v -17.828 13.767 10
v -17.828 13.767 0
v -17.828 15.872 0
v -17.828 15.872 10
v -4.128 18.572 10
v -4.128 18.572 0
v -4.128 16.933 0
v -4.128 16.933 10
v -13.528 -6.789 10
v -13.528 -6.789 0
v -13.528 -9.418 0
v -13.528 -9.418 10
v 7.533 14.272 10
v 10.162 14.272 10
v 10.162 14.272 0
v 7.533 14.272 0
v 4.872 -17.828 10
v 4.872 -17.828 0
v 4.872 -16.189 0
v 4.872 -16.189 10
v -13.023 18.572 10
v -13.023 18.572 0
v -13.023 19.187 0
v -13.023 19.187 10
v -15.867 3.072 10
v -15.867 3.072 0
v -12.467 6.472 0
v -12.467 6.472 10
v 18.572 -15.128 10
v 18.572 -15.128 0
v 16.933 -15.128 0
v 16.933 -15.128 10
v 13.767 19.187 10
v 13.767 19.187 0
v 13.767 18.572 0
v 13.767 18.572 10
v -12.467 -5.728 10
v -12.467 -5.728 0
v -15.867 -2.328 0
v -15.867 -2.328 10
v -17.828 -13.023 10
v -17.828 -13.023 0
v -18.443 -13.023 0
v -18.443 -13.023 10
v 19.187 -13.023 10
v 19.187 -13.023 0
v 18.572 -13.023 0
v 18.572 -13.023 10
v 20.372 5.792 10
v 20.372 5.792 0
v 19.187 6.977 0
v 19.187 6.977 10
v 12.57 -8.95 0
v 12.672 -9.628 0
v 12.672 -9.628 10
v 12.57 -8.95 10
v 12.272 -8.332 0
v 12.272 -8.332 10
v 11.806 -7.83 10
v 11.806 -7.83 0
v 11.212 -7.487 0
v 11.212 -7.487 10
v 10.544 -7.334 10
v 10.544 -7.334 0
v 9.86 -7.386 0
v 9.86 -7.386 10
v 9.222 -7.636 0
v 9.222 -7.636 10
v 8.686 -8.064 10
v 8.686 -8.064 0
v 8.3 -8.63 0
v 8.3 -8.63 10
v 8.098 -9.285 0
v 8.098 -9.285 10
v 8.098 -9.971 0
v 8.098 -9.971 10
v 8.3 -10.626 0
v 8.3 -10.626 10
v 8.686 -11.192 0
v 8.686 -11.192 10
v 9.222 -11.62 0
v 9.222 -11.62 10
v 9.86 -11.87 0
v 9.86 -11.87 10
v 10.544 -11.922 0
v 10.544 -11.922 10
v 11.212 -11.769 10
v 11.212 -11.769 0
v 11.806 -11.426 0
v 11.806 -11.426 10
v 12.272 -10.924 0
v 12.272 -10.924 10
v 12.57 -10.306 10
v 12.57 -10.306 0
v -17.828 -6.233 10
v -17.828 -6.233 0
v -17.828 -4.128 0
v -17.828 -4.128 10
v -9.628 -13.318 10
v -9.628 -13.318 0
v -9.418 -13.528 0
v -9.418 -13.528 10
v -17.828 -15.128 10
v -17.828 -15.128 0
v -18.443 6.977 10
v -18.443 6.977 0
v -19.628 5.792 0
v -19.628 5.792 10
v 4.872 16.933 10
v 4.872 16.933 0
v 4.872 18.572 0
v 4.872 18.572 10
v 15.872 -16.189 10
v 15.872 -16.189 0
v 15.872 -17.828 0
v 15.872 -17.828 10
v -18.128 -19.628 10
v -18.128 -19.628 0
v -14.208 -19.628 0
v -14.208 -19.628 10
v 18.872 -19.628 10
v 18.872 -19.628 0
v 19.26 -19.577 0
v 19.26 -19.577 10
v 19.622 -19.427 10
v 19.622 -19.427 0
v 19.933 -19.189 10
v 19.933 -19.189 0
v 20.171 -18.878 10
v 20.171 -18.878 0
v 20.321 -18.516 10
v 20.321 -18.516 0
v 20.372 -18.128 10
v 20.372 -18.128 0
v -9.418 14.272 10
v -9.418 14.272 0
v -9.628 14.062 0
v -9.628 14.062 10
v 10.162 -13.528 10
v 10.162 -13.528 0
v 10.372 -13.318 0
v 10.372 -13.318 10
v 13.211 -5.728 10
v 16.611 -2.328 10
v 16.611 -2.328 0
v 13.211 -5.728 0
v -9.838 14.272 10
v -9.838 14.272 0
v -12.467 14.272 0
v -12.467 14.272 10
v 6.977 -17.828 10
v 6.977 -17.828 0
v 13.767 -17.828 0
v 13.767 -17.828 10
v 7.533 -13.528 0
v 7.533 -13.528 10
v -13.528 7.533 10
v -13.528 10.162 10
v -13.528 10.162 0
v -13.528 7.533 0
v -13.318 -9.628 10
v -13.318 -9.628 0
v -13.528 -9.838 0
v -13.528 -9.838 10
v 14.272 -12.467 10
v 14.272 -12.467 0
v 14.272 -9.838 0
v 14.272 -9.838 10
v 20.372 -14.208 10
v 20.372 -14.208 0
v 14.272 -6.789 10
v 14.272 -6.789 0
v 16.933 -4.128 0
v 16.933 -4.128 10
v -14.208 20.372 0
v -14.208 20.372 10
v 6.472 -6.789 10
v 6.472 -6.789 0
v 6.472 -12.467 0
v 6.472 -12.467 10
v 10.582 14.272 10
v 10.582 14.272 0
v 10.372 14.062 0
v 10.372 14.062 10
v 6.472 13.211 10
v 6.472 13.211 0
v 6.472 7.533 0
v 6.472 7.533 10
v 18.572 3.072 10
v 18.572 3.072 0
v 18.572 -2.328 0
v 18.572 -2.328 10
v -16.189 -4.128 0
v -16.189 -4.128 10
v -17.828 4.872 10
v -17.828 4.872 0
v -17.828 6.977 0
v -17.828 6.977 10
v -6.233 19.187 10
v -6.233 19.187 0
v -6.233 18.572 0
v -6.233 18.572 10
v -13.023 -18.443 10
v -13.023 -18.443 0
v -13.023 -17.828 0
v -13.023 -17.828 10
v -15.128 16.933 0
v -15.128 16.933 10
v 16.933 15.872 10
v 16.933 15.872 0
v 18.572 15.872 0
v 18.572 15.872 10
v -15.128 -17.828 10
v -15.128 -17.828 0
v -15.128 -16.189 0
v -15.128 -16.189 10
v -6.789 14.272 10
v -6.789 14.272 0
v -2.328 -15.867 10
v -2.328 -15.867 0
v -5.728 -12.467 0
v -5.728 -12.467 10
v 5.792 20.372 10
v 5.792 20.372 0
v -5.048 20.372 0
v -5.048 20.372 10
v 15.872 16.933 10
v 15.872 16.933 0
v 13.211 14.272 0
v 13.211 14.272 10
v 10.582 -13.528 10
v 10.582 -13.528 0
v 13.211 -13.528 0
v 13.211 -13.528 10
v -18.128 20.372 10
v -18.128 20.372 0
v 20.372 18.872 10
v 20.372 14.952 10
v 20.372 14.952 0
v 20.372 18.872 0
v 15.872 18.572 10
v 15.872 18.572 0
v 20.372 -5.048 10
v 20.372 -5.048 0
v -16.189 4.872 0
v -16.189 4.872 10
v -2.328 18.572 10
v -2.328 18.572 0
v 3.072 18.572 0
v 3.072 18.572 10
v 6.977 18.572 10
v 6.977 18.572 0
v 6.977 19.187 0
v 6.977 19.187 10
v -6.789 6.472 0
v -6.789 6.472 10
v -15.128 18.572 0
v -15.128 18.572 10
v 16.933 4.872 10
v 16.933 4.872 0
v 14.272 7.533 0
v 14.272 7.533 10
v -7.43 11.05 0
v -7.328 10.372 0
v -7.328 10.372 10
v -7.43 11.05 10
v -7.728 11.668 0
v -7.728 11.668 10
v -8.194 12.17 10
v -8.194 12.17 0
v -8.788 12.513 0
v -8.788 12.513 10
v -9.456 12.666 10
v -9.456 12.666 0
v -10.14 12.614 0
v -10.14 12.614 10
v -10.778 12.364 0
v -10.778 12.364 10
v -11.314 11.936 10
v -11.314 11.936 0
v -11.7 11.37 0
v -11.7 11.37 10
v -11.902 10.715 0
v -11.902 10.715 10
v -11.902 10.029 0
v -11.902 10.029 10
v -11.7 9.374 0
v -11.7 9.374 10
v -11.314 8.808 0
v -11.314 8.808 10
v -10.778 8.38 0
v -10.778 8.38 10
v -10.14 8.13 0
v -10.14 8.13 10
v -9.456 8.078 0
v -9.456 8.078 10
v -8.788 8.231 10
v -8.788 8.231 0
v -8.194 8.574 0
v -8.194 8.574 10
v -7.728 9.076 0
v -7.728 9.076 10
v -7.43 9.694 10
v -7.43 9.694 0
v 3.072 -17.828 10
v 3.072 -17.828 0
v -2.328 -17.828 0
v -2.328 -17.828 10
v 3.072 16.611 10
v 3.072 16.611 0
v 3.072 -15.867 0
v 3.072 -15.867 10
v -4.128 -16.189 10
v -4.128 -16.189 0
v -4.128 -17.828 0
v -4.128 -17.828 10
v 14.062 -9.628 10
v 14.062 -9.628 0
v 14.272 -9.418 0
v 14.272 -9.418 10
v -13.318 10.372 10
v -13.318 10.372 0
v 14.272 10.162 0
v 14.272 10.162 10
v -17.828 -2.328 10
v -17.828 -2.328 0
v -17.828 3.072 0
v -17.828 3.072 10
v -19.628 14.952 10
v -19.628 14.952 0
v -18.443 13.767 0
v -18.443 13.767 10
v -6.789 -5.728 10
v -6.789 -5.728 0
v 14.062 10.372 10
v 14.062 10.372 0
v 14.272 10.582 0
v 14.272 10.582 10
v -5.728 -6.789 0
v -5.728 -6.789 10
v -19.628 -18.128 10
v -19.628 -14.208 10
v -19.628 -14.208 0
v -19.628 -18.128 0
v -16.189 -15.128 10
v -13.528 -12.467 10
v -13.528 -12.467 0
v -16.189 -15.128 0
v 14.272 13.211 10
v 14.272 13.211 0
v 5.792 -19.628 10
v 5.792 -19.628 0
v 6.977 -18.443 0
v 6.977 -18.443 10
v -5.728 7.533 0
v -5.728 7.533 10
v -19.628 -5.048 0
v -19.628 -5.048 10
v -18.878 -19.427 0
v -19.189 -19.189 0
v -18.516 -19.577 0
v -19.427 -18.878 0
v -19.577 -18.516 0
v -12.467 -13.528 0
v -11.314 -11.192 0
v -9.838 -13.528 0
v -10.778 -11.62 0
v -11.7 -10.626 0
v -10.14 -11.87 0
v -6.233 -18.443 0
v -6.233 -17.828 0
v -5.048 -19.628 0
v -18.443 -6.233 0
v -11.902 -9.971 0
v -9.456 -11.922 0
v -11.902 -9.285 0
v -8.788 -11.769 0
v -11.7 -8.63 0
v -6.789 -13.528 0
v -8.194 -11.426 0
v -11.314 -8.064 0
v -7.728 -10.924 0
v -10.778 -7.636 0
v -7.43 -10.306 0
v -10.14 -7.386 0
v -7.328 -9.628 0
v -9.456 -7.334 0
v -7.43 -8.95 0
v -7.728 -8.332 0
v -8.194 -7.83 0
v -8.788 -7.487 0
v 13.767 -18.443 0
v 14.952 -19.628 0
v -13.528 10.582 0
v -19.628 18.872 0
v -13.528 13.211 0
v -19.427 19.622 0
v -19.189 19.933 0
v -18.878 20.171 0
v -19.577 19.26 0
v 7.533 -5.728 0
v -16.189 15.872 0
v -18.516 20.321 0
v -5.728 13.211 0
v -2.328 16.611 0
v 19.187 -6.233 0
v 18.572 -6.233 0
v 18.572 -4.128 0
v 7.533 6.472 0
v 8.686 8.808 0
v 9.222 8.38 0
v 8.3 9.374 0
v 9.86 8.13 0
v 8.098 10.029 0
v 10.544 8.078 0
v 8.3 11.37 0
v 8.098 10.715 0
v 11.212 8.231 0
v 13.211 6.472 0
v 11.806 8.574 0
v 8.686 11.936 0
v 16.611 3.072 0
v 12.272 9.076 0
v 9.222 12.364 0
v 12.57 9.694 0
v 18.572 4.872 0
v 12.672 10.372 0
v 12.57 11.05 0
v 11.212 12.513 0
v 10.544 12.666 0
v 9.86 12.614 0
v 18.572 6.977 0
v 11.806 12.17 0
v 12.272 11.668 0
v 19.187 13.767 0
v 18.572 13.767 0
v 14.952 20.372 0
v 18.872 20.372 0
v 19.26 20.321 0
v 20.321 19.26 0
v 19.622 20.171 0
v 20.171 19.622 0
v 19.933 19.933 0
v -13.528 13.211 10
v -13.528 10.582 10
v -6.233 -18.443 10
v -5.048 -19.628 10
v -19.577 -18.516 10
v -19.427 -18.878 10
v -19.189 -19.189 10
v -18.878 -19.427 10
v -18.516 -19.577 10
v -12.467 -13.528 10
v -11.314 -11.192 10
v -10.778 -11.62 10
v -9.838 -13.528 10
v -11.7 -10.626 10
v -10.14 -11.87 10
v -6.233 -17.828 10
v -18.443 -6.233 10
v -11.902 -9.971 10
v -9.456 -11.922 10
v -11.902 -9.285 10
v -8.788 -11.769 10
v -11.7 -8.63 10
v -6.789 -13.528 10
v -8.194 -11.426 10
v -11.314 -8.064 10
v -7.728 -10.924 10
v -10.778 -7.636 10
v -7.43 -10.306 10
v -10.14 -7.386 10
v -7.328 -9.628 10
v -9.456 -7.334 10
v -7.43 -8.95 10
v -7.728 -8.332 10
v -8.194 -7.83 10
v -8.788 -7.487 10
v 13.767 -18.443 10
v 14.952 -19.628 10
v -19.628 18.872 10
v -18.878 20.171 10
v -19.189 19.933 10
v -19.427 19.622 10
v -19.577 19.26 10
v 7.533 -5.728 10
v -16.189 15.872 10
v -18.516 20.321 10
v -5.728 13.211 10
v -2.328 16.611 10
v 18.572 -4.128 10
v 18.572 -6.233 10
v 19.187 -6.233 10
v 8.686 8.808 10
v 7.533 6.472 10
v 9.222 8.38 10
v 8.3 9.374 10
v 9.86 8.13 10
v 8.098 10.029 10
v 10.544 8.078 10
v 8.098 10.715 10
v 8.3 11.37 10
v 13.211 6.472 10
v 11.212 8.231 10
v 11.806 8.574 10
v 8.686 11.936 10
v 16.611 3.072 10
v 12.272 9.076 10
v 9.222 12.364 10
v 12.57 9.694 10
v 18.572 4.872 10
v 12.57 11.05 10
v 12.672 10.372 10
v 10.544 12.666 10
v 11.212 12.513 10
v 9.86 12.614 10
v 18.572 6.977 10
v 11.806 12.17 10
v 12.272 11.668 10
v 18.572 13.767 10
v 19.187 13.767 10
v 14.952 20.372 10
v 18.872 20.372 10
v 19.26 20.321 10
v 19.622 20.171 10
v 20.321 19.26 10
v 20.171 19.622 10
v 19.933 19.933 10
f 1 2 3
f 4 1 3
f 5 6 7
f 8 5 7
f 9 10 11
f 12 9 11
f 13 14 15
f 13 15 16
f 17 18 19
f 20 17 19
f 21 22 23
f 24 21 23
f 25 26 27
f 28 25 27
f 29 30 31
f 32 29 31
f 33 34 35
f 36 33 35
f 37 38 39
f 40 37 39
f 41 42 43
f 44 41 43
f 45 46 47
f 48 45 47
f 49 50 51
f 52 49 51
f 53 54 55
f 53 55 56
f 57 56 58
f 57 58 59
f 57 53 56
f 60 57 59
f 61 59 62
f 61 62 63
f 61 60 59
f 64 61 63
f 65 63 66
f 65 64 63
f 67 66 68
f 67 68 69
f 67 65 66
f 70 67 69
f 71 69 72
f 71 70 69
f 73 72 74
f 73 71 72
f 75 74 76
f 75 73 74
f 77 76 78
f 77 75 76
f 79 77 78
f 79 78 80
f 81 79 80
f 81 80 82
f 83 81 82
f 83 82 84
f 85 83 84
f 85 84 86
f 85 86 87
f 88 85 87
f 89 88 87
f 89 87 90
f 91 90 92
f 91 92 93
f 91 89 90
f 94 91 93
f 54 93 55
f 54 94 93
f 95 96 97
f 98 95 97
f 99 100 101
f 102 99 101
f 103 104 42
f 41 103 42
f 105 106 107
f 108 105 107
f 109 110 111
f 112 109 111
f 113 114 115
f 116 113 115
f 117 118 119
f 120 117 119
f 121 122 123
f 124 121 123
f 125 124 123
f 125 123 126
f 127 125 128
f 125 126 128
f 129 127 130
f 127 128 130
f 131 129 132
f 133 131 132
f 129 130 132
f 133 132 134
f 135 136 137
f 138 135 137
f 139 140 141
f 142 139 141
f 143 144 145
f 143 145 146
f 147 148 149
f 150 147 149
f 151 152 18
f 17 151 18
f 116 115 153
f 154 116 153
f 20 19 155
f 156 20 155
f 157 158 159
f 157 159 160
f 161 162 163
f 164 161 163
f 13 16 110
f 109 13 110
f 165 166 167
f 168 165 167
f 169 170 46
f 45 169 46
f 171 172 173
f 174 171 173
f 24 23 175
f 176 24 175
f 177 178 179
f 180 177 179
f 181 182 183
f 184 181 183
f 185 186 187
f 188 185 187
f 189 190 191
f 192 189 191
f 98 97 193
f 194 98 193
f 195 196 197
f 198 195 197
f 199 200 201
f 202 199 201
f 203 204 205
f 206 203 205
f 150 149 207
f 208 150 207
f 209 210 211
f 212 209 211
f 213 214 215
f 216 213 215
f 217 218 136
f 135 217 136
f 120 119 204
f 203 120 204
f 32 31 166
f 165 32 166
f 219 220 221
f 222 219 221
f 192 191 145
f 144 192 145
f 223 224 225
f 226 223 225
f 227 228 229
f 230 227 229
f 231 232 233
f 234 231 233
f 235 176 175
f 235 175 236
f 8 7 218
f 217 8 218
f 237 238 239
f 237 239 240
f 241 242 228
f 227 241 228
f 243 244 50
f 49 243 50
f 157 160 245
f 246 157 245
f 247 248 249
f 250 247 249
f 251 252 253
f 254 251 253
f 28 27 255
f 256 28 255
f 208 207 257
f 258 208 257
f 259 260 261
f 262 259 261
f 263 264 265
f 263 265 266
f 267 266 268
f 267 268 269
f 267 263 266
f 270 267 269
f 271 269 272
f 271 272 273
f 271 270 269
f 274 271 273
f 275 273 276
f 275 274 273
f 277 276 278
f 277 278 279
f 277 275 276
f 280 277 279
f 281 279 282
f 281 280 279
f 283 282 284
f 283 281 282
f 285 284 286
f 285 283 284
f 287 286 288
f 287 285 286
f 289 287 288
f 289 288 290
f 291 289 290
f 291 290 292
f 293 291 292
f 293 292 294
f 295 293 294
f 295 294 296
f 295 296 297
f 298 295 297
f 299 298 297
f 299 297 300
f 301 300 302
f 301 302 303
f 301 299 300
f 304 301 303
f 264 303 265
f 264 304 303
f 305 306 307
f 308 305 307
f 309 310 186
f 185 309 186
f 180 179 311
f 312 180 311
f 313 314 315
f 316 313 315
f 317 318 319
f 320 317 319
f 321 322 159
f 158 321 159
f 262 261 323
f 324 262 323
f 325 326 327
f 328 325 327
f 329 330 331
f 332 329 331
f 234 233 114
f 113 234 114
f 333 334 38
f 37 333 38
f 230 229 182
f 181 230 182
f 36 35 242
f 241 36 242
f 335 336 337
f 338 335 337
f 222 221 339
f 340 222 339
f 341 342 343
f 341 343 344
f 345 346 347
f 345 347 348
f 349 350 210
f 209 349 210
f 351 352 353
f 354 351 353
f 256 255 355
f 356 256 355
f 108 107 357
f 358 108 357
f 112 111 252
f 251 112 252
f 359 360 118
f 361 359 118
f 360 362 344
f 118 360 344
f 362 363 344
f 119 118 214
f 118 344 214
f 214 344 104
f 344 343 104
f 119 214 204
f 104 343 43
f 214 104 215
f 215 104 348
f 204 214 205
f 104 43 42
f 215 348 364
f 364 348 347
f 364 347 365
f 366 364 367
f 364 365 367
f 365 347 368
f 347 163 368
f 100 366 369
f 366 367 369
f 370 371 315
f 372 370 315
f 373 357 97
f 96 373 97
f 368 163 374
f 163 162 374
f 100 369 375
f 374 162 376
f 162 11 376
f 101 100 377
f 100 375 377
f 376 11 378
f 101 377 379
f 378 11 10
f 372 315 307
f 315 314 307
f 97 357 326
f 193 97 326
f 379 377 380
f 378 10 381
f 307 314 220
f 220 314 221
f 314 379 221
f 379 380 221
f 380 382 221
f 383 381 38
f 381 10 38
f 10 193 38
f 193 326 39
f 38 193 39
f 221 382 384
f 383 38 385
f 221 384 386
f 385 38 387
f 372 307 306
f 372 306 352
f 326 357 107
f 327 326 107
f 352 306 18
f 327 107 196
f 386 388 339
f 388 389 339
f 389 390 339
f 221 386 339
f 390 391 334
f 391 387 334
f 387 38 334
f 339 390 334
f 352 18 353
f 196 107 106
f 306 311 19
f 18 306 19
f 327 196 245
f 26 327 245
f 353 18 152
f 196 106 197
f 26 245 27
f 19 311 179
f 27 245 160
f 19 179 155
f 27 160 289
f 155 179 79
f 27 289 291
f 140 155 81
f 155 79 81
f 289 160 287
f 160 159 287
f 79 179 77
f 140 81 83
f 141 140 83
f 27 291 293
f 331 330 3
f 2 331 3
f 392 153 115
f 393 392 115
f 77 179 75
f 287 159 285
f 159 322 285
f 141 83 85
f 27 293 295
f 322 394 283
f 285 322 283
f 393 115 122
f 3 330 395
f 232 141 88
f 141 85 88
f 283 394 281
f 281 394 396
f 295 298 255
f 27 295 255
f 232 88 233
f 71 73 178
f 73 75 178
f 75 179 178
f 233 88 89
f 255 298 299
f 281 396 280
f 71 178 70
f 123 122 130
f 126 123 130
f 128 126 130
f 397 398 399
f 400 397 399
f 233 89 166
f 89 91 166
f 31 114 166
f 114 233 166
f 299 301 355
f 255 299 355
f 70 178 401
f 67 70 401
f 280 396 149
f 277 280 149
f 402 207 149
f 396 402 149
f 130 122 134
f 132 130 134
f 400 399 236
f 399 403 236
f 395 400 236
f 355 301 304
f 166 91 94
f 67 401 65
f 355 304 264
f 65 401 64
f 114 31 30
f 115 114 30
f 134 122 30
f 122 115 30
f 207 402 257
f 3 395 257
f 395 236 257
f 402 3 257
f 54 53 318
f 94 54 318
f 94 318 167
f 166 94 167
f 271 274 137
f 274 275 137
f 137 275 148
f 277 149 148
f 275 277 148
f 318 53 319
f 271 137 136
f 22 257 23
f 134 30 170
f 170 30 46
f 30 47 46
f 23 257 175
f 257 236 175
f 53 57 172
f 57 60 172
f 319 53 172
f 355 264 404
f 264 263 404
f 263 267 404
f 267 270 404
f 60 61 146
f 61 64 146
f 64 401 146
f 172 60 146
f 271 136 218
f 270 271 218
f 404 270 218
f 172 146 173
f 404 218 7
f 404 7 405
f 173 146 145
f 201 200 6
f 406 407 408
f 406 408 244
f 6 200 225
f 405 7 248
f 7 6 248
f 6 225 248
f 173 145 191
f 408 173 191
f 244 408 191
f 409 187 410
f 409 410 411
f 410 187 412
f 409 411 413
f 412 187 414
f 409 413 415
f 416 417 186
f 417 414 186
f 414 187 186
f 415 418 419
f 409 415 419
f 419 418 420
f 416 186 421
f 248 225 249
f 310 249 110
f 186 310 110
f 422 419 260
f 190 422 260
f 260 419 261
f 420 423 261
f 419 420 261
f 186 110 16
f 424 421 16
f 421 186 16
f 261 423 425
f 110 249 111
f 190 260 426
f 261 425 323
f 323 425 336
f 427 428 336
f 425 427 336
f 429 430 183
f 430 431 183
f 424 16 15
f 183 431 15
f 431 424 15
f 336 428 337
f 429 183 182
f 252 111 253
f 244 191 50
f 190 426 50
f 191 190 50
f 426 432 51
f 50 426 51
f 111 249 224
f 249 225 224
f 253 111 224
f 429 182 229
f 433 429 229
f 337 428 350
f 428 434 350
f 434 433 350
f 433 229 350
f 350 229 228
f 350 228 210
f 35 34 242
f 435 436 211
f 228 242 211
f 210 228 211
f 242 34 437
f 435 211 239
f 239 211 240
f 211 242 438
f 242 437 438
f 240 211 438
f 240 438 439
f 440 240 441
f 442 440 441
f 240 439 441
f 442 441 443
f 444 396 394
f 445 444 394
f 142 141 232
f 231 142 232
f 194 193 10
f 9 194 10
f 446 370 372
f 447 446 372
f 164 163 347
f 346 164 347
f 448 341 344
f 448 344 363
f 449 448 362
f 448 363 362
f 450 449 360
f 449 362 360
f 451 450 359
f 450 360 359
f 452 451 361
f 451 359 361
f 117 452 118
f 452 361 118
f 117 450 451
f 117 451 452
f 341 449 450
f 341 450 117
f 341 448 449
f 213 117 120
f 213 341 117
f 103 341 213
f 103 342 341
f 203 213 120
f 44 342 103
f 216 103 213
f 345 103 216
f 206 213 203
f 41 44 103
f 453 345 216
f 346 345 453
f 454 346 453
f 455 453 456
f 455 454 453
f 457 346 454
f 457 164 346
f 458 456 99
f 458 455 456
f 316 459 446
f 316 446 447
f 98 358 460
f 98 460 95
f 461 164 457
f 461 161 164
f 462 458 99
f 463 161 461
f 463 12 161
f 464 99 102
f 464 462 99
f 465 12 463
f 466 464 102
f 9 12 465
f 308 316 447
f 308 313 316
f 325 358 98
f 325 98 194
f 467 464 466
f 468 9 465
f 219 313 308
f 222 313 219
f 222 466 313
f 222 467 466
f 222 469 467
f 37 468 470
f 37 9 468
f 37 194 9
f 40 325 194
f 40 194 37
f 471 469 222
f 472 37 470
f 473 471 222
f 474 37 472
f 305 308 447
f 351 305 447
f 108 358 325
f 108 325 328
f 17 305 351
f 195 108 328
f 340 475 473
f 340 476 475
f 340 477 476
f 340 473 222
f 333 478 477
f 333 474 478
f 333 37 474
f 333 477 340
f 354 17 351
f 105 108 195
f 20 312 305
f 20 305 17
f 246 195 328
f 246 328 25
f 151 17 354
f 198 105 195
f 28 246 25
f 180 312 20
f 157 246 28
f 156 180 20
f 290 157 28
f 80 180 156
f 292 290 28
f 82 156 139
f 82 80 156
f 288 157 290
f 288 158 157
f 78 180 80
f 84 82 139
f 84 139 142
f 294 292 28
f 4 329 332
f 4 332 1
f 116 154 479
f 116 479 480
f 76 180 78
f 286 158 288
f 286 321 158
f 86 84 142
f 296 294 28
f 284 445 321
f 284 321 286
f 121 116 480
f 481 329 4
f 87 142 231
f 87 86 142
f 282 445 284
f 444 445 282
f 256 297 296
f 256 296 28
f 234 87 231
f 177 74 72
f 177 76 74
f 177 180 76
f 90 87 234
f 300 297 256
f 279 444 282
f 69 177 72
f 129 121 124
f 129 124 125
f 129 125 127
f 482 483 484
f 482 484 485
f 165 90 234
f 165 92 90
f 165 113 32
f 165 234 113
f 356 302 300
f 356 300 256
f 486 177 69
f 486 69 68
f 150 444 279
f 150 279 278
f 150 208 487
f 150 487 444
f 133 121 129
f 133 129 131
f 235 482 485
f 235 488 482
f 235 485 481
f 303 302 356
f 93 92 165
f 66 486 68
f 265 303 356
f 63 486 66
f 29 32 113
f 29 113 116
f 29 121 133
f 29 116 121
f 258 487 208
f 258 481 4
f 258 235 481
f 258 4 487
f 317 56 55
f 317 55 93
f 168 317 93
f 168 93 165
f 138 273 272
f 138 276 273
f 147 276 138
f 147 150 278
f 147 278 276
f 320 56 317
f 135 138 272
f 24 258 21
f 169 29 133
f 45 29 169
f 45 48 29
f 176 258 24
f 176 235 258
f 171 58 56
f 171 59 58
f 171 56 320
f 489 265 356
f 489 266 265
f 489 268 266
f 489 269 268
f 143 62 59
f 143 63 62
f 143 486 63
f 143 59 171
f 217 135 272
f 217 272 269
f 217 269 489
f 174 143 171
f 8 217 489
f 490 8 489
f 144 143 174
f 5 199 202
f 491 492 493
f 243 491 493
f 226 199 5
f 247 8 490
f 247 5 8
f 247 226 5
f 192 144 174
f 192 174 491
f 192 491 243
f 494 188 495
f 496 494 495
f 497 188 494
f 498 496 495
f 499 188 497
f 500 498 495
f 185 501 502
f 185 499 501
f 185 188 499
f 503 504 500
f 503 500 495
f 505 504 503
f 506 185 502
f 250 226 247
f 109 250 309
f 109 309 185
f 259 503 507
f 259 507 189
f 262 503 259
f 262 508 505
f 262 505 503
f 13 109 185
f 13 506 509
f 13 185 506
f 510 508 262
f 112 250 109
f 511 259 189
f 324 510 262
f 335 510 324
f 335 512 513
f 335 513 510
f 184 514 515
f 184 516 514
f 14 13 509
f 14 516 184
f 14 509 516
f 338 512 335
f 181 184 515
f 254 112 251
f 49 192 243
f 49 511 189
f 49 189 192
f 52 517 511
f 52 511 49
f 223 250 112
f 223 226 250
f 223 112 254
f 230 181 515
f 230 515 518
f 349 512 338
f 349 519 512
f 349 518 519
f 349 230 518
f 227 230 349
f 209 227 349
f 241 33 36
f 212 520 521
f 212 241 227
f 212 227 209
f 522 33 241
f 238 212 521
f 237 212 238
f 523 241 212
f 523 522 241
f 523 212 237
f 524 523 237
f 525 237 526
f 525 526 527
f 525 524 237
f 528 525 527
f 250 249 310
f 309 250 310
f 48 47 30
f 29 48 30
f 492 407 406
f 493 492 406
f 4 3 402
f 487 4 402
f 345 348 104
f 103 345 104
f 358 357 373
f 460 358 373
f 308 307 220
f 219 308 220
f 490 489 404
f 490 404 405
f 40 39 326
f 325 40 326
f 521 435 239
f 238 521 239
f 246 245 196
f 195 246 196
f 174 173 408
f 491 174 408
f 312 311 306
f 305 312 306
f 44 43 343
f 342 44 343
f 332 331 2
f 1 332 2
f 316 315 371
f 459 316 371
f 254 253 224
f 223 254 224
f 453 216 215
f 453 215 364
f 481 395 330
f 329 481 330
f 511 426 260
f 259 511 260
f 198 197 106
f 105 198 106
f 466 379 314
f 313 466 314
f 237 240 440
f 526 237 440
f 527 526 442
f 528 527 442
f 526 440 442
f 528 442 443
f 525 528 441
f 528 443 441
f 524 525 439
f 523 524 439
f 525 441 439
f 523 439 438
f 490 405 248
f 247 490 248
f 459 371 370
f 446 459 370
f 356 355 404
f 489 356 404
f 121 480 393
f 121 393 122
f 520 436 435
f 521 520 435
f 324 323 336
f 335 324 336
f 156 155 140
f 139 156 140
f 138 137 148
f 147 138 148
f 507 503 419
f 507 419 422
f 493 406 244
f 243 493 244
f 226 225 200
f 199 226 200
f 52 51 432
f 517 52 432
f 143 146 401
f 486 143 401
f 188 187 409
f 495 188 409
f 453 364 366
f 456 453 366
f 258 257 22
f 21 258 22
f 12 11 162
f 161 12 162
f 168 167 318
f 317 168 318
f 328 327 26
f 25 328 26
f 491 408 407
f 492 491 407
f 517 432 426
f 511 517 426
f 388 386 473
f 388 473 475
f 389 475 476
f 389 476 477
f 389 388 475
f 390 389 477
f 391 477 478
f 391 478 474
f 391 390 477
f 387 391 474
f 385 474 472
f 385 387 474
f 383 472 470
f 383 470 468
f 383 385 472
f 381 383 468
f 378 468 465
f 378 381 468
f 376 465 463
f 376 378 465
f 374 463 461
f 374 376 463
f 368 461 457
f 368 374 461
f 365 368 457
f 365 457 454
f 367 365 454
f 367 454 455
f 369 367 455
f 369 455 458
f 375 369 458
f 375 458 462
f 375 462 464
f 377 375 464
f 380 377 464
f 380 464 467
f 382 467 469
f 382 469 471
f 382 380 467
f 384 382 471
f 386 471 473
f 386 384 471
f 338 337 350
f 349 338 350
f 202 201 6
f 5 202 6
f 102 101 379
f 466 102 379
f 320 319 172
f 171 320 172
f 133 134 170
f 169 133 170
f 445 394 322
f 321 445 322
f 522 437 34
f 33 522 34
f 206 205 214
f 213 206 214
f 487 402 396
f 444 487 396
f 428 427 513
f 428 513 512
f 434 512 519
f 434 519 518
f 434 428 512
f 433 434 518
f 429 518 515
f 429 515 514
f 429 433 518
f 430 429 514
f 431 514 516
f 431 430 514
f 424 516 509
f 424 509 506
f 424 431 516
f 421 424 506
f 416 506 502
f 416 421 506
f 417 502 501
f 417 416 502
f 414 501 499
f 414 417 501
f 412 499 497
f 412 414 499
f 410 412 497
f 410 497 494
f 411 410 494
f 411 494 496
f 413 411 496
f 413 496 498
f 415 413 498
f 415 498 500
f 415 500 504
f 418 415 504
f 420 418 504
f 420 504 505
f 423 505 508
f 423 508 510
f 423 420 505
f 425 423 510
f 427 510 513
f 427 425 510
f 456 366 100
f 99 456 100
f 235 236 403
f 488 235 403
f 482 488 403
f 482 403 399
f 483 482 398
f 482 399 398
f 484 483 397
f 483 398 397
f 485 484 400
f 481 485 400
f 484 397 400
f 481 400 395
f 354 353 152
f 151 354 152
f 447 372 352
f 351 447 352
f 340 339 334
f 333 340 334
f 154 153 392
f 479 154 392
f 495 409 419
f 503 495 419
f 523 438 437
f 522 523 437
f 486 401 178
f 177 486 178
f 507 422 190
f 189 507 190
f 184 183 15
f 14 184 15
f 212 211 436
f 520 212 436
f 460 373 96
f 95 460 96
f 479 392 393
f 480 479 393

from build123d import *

# Parameters (mm, degrees)
SKETCH1_R           = 2.3
BOSS_EXTRUDE1_DEPTH = 10


with BuildPart() as part:
    # Sketch1 → Boss-Extrude1 (new body)
    with BuildSketch(Plane.XY):
        with BuildLine():
            Line((14.271948898, -9.838051102), (14.061948898, -9.628051102))
            Line((14.061948898, -9.628051102), (14.271948898, -9.418051102))
            Line((14.271948898, -9.418051102), (14.271948898, -6.788711274))
            Line((14.271948898, -6.788711274), (16.932609069, -4.128051102))
            Line((16.932609069, -4.128051102), (18.571948898, -4.128051102))
            Line((18.571948898, -4.128051102), (18.571948898, -6.233051102))
            Line((18.571948898, -6.233051102), (19.186948898, -6.233051102))
            Line((19.186948898, -6.233051102), (20.371948898, -5.048051102))
            Line((20.371948898, -5.048051102), (20.371948898, 5.791948898))
            Line((20.371948898, 5.791948898), (19.186948898, 6.976948898))
            Line((19.186948898, 6.976948898), (18.571948898, 6.976948898))
            Line((18.571948898, 6.976948898), (18.571948898, 4.871948898))
            Line((18.571948898, 4.871948898), (16.932609069, 4.871948898))
            Line((16.932609069, 4.871948898), (14.271948898, 7.532609069))
            Line((14.271948898, 7.532609069), (14.271948898, 10.161948898))
            Line((14.271948898, 10.161948898), (14.061948898, 10.371948898))
            Line((14.061948898, 10.371948898), (14.271948898, 10.581948898))
            Line((14.271948898, 10.581948898), (14.271948898, 13.211288726))
            Line((14.271948898, 13.211288726), (16.932609069, 15.871948898))
            Line((16.932609069, 15.871948898), (18.571948898, 15.871948898))
            Line((18.571948898, 15.871948898), (18.571948898, 13.766948898))
            Line((18.571948898, 13.766948898), (19.186948898, 13.766948898))
            Line((19.186948898, 13.766948898), (20.371948898, 14.951948898))
            Line((20.371948898, 14.951948898), (20.371948898, 18.871948898))
            ThreePointArc((20.371948898, 18.871948898), (19.932609069, 19.932609069), (18.871948898, 20.371948898))
            Line((18.871948898, 20.371948898), (14.951948898, 20.371948898))
            Line((14.951948898, 20.371948898), (13.766948898, 19.186948898))
            Line((13.766948898, 19.186948898), (13.766948898, 18.571948898))
            Line((13.766948898, 18.571948898), (15.871948898, 18.571948898))
            Line((15.871948898, 18.571948898), (15.871948898, 16.932609069))
            Line((15.871948898, 16.932609069), (13.211288726, 14.271948898))
            Line((13.211288726, 14.271948898), (10.581948898, 14.271948898))
            Line((10.581948898, 14.271948898), (10.371948898, 14.061948898))
            Line((10.371948898, 14.061948898), (10.161948898, 14.271948898))
            Line((10.161948898, 14.271948898), (7.532609069, 14.271948898))
            Line((7.532609069, 14.271948898), (4.871948898, 16.932609069))
            Line((4.871948898, 16.932609069), (4.871948898, 18.571948898))
            Line((4.871948898, 18.571948898), (6.976948898, 18.571948898))
            Line((6.976948898, 18.571948898), (6.976948898, 19.186948898))
            Line((6.976948898, 19.186948898), (5.791948898, 20.371948898))
            Line((5.791948898, 20.371948898), (-5.048051102, 20.371948898))
            Line((-5.048051102, 20.371948898), (-6.233051102, 19.186948898))
            Line((-6.233051102, 19.186948898), (-6.233051102, 18.571948898))
            Line((-6.233051102, 18.571948898), (-4.128051102, 18.571948898))
            Line((-4.128051102, 18.571948898), (-4.128051102, 16.932609069))
            Line((-4.128051102, 16.932609069), (-6.788711274, 14.271948898))
            Line((-6.788711274, 14.271948898), (-9.418051102, 14.271948898))
            Line((-9.418051102, 14.271948898), (-9.628051102, 14.061948898))
            Line((-9.628051102, 14.061948898), (-9.838051102, 14.271948898))
            Line((-9.838051102, 14.271948898), (-12.467390931, 14.271948898))
            Line((-12.467390931, 14.271948898), (-15.128051102, 16.932609069))
            Line((-15.128051102, 16.932609069), (-15.128051102, 18.571948898))
            Line((-15.128051102, 18.571948898), (-13.023051102, 18.571948898))
            Line((-13.023051102, 18.571948898), (-13.023051102, 19.186948898))
            Line((-13.023051102, 19.186948898), (-14.208051102, 20.371948898))
            Line((-14.208051102, 20.371948898), (-18.128051102, 20.371948898))
            ThreePointArc((-18.128051102, 20.371948898), (-19.188711274, 19.932609069), (-19.628051102, 18.871948898))
            Line((-19.628051102, 18.871948898), (-19.628051102, 14.951948898))
            Line((-19.628051102, 14.951948898), (-18.443051102, 13.766948898))
            Line((-18.443051102, 13.766948898), (-17.828051102, 13.766948898))
            Line((-17.828051102, 13.766948898), (-17.828051102, 15.871948898))
            Line((-17.828051102, 15.871948898), (-16.188711274, 15.871948898))
            Line((-16.188711274, 15.871948898), (-13.528051102, 13.211288726))
            Line((-13.528051102, 13.211288726), (-13.528051102, 10.581948898))
            Line((-13.528051102, 10.581948898), (-13.318051102, 10.371948898))
            Line((-13.318051102, 10.371948898), (-13.528051102, 10.161948898))
            Line((-13.528051102, 10.161948898), (-13.528051102, 7.532609069))
            Line((-13.528051102, 7.532609069), (-16.188711274, 4.871948898))
            Line((-16.188711274, 4.871948898), (-17.828051102, 4.871948898))
            Line((-17.828051102, 4.871948898), (-17.828051102, 6.976948898))
            Line((-17.828051102, 6.976948898), (-18.443051102, 6.976948898))
            Line((-18.443051102, 6.976948898), (-19.628051102, 5.791948898))
            Line((-19.628051102, 5.791948898), (-19.628051102, -5.048051102))
            Line((-19.628051102, -5.048051102), (-18.443051102, -6.233051102))
            Line((-18.443051102, -6.233051102), (-17.828051102, -6.233051102))
            Line((-17.828051102, -6.233051102), (-17.828051102, -4.128051102))
            Line((-17.828051102, -4.128051102), (-16.188711274, -4.128051102))
            Line((-16.188711274, -4.128051102), (-13.528051102, -6.788711274))
            Line((-13.528051102, -6.788711274), (-13.528051102, -9.418051102))
            Line((-13.528051102, -9.418051102), (-13.318051102, -9.628051102))
            Line((-13.318051102, -9.628051102), (-13.528051102, -9.838051102))
            Line((-13.528051102, -9.838051102), (-13.528051102, -12.467390931))
            Line((-13.528051102, -12.467390931), (-16.188711274, -15.128051102))
            Line((-16.188711274, -15.128051102), (-17.828051102, -15.128051102))
            Line((-17.828051102, -15.128051102), (-17.828051102, -13.023051102))
            Line((-17.828051102, -13.023051102), (-18.443051102, -13.023051102))
            Line((-18.443051102, -13.023051102), (-19.628051102, -14.208051102))
            Line((-19.628051102, -14.208051102), (-19.628051102, -18.128051102))
            ThreePointArc((-19.628051102, -18.128051102), (-19.188711274, -19.188711274), (-18.128051102, -19.628051102))
            Line((-18.128051102, -19.628051102), (-14.208051102, -19.628051102))
            Line((-14.208051102, -19.628051102), (-13.023051102, -18.443051102))
            Line((-13.023051102, -18.443051102), (-13.023051102, -17.828051102))
            Line((-13.023051102, -17.828051102), (-15.128051102, -17.828051102))
            Line((-15.128051102, -17.828051102), (-15.128051102, -16.188711274))
            Line((-15.128051102, -16.188711274), (-12.467390931, -13.528051102))
            Line((-12.467390931, -13.528051102), (-9.838051102, -13.528051102))
            Line((-9.838051102, -13.528051102), (-9.628051102, -13.318051102))
            Line((-9.628051102, -13.318051102), (-9.418051102, -13.528051102))
            Line((-9.418051102, -13.528051102), (-6.788711274, -13.528051102))
            Line((-6.788711274, -13.528051102), (-4.128051102, -16.188711274))
            Line((-4.128051102, -16.188711274), (-4.128051102, -17.828051102))
            Line((-4.128051102, -17.828051102), (-6.233051102, -17.828051102))
            Line((-6.233051102, -17.828051102), (-6.233051102, -18.443051102))
            Line((-6.233051102, -18.443051102), (-5.048051102, -19.628051102))
            Line((-5.048051102, -19.628051102), (5.791948898, -19.628051102))
            Line((5.791948898, -19.628051102), (6.976948898, -18.443051102))
            Line((6.976948898, -18.443051102), (6.976948898, -17.828051102))
            Line((6.976948898, -17.828051102), (4.871948898, -17.828051102))
            Line((4.871948898, -17.828051102), (4.871948898, -16.188711274))
            Line((4.871948898, -16.188711274), (7.532609069, -13.528051102))
            Line((7.532609069, -13.528051102), (10.161948898, -13.528051102))
            Line((10.161948898, -13.528051102), (10.371948898, -13.318051102))
            Line((10.371948898, -13.318051102), (10.581948898, -13.528051102))
            Line((10.581948898, -13.528051102), (13.211288726, -13.528051102))
            Line((13.211288726, -13.528051102), (15.871948898, -16.188711274))
            Line((15.871948898, -16.188711274), (15.871948898, -17.828051102))
            Line((15.871948898, -17.828051102), (13.766948898, -17.828051102))
            Line((13.766948898, -17.828051102), (13.766948898, -18.443051102))
            Line((13.766948898, -18.443051102), (14.951948898, -19.628051102))
            Line((14.951948898, -19.628051102), (18.871948898, -19.628051102))
            ThreePointArc((18.871948898, -19.628051102), (19.932609069, -19.188711274), (20.371948898, -18.128051102))
            Line((20.371948898, -18.128051102), (20.371948898, -14.208051102))
            Line((20.371948898, -14.208051102), (19.186948898, -13.023051102))
            Line((19.186948898, -13.023051102), (18.571948898, -13.023051102))
            Line((18.571948898, -13.023051102), (18.571948898, -15.128051102))
            Line((18.571948898, -15.128051102), (16.932609069, -15.128051102))
            Line((16.932609069, -15.128051102), (14.271948898, -12.467390931))
            Line((14.271948898, -12.467390931), (14.271948898, -9.838051102))
        make_face()
        with Locations((-9.628051102, -9.628051102)):
            Circle(SKETCH1_R, mode=Mode.SUBTRACT)
        with Locations((10.371948898, -9.628051102)):
            Circle(SKETCH1_R, mode=Mode.SUBTRACT)
        with Locations((10.371948898, 10.371948898)):
            Circle(SKETCH1_R, mode=Mode.SUBTRACT)
        with Locations((-9.628051102, 10.371948898)):
            Circle(SKETCH1_R, mode=Mode.SUBTRACT)
        Polygon((-12.467390931, 6.471948898), (-6.788711274, 6.471948898), (-5.728051102, 7.532609069), (-5.728051102, 13.211288726), (-2.328051102, 16.611288726), (-2.328051102, 18.571948898), (3.071948898, 18.571948898), (3.071948898, 16.611288726), (6.471948898, 13.211288726), (6.471948898, 7.532609069), (7.532609069, 6.471948898), (13.211288726, 6.471948898), (16.611288726, 3.071948898), (18.571948898, 3.071948898), (18.571948898, -2.328051102), (16.611288726, -2.328051102), (13.211288726, -5.728051102), (7.532609069, -5.728051102), (6.471948898, -6.788711274), (6.471948898, -12.467390931), (3.071948898, -15.867390931), (3.071948898, -17.828051102), (-2.328051102, -17.828051102), (-2.328051102, -15.867390931), (-5.728051102, -12.467390931), (-5.728051102, -6.788711274), (-6.788711274, -5.728051102), (-12.467390931, -5.728051102), (-15.867390931, -2.328051102), (-17.828051102, -2.328051102), (-17.828051102, 3.071948898), (-15.867390931, 3.071948898), align=None, mode=Mode.SUBTRACT)
    extrude(amount=BOSS_EXTRUDE1_DEPTH)


solid = part.part
